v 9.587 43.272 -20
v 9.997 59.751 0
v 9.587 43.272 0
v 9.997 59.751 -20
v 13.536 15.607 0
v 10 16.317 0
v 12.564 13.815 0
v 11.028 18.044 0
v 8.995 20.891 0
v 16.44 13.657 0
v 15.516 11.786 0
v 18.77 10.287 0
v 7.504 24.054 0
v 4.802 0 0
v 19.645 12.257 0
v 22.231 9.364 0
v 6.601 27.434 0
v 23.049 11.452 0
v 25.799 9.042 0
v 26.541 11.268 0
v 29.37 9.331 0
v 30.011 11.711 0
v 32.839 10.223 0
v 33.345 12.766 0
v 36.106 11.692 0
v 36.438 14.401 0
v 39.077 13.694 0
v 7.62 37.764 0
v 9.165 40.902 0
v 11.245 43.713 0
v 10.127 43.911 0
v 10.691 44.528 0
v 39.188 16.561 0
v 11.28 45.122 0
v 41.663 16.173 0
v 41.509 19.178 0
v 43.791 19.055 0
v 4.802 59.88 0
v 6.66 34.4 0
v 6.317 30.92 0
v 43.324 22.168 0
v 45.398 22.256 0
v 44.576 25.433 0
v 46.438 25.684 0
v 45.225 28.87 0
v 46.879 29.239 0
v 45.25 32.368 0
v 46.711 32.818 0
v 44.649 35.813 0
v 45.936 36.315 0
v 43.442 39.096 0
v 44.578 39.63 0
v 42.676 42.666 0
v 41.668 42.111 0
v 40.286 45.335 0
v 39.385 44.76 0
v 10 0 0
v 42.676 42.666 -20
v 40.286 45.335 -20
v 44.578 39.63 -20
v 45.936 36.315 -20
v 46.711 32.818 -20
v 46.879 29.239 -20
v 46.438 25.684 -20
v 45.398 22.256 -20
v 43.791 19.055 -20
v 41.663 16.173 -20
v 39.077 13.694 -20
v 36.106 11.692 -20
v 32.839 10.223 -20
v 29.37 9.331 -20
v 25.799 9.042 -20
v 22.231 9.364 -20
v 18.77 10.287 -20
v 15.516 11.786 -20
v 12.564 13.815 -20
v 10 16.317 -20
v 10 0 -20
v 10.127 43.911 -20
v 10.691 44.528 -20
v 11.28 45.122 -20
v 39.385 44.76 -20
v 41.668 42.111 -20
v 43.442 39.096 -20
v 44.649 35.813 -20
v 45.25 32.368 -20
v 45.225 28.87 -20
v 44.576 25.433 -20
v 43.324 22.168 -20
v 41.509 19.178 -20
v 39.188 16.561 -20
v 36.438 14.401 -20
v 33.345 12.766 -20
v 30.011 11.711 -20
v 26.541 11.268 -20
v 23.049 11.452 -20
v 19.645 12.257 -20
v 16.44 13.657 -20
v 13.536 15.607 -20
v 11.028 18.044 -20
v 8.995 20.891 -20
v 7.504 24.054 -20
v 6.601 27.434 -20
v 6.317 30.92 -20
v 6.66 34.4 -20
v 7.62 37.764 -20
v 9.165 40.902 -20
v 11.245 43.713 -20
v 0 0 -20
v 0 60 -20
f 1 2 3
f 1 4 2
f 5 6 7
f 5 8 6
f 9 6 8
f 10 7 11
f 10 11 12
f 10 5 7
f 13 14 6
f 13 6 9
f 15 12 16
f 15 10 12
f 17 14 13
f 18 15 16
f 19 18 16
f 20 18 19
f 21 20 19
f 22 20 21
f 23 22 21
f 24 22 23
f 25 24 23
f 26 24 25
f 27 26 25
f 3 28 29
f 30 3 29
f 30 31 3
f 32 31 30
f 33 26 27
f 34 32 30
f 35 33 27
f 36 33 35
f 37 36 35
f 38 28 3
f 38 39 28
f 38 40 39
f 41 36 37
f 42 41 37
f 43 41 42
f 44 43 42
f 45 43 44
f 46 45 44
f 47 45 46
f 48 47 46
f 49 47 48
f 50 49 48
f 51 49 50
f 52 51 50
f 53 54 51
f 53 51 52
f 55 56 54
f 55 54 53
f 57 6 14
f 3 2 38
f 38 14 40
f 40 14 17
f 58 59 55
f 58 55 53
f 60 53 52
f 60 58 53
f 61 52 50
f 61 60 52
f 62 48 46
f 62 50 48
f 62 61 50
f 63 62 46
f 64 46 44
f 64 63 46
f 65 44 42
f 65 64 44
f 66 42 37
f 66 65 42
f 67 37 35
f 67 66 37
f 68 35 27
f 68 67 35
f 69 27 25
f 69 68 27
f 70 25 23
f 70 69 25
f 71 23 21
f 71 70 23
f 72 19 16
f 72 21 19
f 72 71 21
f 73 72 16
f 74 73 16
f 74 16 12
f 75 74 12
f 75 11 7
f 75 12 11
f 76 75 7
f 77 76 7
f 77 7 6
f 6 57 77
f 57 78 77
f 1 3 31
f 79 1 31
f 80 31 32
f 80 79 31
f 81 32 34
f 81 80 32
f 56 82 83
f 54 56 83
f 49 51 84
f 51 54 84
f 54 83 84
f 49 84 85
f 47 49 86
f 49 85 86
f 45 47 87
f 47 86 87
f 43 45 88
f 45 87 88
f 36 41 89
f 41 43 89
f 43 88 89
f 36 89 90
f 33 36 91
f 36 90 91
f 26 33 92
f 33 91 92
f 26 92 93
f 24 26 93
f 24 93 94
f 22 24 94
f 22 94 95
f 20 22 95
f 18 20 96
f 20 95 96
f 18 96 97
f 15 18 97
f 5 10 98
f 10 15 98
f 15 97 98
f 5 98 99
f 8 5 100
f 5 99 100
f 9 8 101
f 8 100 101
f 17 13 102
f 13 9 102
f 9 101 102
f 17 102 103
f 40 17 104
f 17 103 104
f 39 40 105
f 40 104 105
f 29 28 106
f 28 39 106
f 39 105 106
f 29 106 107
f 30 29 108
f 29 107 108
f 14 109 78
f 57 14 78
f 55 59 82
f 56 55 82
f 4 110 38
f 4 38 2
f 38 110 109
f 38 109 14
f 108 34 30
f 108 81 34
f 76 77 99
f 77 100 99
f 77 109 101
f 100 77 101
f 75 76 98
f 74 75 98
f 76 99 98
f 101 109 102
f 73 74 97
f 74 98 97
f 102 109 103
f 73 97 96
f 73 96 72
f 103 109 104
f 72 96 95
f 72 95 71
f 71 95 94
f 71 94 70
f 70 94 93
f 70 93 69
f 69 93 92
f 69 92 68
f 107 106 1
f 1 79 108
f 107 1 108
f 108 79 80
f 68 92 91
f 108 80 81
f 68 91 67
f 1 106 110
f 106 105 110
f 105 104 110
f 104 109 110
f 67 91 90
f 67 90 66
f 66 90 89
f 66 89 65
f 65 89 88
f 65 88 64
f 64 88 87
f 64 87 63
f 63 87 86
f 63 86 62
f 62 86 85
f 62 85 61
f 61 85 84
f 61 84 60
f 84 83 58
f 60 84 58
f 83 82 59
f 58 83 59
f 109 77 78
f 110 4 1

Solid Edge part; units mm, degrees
sketch "Sketch1" plane through (23.4359, 29.9999, -20) normal (0, 0, -1) x (-0.024896, -0.99969, 0)
  arc A0 (-14.815, 12.5282) -> (-12.9235, 14.1753) centre (-0.103, -2.457) cw
  line L0 (-29.4072, 14.1753) -> (-12.9235, 14.1753)
  line L1 (-29.4072, 24.1753) -> (-29.4072, 14.1753)
  line L2 (-29.4072, 24.1753) -> (30.5741, 22.6818)
  line L3 (30.5741, 22.6818) -> (30.3252, 12.6849)
  line L4 (30.3252, 12.6849) -> (14.0129, 13.091)
  line L5 (-15.7497, -16.4635) -> (-15.1524, -15.5764)
  line L6 (-14.815, 12.5282) -> (-13.4055, 12.5282)
  arc A1 (14.0129, 13.091) -> (-15.7497, -16.4635) centre (-0.103, -2.4571) cw
  arc A2 (-13.4055, 12.5282) -> (-15.1524, -15.5765) centre (-0.8135, -2.3611) cw
extrude "Protrusion1" add sketch "Sketch1" against normal blind 20
sketch "Sketch2" plane through (5.0002, -0.0001, -10) normal (0, -1, 0) x (1, 0, 0)
  line L0 (-5.0001, 10.0001) -> (-5.0001, -9.9998)
  line L1 (-5.0001, -9.9998) -> (-0.1985, 10.0001)
  line L2 (-0.1985, 10.0001) -> (-5.0001, 10.0001)
extrude "ExtrudedCutout_2" cut sketch "Sketch2" against normal blind 84.595
